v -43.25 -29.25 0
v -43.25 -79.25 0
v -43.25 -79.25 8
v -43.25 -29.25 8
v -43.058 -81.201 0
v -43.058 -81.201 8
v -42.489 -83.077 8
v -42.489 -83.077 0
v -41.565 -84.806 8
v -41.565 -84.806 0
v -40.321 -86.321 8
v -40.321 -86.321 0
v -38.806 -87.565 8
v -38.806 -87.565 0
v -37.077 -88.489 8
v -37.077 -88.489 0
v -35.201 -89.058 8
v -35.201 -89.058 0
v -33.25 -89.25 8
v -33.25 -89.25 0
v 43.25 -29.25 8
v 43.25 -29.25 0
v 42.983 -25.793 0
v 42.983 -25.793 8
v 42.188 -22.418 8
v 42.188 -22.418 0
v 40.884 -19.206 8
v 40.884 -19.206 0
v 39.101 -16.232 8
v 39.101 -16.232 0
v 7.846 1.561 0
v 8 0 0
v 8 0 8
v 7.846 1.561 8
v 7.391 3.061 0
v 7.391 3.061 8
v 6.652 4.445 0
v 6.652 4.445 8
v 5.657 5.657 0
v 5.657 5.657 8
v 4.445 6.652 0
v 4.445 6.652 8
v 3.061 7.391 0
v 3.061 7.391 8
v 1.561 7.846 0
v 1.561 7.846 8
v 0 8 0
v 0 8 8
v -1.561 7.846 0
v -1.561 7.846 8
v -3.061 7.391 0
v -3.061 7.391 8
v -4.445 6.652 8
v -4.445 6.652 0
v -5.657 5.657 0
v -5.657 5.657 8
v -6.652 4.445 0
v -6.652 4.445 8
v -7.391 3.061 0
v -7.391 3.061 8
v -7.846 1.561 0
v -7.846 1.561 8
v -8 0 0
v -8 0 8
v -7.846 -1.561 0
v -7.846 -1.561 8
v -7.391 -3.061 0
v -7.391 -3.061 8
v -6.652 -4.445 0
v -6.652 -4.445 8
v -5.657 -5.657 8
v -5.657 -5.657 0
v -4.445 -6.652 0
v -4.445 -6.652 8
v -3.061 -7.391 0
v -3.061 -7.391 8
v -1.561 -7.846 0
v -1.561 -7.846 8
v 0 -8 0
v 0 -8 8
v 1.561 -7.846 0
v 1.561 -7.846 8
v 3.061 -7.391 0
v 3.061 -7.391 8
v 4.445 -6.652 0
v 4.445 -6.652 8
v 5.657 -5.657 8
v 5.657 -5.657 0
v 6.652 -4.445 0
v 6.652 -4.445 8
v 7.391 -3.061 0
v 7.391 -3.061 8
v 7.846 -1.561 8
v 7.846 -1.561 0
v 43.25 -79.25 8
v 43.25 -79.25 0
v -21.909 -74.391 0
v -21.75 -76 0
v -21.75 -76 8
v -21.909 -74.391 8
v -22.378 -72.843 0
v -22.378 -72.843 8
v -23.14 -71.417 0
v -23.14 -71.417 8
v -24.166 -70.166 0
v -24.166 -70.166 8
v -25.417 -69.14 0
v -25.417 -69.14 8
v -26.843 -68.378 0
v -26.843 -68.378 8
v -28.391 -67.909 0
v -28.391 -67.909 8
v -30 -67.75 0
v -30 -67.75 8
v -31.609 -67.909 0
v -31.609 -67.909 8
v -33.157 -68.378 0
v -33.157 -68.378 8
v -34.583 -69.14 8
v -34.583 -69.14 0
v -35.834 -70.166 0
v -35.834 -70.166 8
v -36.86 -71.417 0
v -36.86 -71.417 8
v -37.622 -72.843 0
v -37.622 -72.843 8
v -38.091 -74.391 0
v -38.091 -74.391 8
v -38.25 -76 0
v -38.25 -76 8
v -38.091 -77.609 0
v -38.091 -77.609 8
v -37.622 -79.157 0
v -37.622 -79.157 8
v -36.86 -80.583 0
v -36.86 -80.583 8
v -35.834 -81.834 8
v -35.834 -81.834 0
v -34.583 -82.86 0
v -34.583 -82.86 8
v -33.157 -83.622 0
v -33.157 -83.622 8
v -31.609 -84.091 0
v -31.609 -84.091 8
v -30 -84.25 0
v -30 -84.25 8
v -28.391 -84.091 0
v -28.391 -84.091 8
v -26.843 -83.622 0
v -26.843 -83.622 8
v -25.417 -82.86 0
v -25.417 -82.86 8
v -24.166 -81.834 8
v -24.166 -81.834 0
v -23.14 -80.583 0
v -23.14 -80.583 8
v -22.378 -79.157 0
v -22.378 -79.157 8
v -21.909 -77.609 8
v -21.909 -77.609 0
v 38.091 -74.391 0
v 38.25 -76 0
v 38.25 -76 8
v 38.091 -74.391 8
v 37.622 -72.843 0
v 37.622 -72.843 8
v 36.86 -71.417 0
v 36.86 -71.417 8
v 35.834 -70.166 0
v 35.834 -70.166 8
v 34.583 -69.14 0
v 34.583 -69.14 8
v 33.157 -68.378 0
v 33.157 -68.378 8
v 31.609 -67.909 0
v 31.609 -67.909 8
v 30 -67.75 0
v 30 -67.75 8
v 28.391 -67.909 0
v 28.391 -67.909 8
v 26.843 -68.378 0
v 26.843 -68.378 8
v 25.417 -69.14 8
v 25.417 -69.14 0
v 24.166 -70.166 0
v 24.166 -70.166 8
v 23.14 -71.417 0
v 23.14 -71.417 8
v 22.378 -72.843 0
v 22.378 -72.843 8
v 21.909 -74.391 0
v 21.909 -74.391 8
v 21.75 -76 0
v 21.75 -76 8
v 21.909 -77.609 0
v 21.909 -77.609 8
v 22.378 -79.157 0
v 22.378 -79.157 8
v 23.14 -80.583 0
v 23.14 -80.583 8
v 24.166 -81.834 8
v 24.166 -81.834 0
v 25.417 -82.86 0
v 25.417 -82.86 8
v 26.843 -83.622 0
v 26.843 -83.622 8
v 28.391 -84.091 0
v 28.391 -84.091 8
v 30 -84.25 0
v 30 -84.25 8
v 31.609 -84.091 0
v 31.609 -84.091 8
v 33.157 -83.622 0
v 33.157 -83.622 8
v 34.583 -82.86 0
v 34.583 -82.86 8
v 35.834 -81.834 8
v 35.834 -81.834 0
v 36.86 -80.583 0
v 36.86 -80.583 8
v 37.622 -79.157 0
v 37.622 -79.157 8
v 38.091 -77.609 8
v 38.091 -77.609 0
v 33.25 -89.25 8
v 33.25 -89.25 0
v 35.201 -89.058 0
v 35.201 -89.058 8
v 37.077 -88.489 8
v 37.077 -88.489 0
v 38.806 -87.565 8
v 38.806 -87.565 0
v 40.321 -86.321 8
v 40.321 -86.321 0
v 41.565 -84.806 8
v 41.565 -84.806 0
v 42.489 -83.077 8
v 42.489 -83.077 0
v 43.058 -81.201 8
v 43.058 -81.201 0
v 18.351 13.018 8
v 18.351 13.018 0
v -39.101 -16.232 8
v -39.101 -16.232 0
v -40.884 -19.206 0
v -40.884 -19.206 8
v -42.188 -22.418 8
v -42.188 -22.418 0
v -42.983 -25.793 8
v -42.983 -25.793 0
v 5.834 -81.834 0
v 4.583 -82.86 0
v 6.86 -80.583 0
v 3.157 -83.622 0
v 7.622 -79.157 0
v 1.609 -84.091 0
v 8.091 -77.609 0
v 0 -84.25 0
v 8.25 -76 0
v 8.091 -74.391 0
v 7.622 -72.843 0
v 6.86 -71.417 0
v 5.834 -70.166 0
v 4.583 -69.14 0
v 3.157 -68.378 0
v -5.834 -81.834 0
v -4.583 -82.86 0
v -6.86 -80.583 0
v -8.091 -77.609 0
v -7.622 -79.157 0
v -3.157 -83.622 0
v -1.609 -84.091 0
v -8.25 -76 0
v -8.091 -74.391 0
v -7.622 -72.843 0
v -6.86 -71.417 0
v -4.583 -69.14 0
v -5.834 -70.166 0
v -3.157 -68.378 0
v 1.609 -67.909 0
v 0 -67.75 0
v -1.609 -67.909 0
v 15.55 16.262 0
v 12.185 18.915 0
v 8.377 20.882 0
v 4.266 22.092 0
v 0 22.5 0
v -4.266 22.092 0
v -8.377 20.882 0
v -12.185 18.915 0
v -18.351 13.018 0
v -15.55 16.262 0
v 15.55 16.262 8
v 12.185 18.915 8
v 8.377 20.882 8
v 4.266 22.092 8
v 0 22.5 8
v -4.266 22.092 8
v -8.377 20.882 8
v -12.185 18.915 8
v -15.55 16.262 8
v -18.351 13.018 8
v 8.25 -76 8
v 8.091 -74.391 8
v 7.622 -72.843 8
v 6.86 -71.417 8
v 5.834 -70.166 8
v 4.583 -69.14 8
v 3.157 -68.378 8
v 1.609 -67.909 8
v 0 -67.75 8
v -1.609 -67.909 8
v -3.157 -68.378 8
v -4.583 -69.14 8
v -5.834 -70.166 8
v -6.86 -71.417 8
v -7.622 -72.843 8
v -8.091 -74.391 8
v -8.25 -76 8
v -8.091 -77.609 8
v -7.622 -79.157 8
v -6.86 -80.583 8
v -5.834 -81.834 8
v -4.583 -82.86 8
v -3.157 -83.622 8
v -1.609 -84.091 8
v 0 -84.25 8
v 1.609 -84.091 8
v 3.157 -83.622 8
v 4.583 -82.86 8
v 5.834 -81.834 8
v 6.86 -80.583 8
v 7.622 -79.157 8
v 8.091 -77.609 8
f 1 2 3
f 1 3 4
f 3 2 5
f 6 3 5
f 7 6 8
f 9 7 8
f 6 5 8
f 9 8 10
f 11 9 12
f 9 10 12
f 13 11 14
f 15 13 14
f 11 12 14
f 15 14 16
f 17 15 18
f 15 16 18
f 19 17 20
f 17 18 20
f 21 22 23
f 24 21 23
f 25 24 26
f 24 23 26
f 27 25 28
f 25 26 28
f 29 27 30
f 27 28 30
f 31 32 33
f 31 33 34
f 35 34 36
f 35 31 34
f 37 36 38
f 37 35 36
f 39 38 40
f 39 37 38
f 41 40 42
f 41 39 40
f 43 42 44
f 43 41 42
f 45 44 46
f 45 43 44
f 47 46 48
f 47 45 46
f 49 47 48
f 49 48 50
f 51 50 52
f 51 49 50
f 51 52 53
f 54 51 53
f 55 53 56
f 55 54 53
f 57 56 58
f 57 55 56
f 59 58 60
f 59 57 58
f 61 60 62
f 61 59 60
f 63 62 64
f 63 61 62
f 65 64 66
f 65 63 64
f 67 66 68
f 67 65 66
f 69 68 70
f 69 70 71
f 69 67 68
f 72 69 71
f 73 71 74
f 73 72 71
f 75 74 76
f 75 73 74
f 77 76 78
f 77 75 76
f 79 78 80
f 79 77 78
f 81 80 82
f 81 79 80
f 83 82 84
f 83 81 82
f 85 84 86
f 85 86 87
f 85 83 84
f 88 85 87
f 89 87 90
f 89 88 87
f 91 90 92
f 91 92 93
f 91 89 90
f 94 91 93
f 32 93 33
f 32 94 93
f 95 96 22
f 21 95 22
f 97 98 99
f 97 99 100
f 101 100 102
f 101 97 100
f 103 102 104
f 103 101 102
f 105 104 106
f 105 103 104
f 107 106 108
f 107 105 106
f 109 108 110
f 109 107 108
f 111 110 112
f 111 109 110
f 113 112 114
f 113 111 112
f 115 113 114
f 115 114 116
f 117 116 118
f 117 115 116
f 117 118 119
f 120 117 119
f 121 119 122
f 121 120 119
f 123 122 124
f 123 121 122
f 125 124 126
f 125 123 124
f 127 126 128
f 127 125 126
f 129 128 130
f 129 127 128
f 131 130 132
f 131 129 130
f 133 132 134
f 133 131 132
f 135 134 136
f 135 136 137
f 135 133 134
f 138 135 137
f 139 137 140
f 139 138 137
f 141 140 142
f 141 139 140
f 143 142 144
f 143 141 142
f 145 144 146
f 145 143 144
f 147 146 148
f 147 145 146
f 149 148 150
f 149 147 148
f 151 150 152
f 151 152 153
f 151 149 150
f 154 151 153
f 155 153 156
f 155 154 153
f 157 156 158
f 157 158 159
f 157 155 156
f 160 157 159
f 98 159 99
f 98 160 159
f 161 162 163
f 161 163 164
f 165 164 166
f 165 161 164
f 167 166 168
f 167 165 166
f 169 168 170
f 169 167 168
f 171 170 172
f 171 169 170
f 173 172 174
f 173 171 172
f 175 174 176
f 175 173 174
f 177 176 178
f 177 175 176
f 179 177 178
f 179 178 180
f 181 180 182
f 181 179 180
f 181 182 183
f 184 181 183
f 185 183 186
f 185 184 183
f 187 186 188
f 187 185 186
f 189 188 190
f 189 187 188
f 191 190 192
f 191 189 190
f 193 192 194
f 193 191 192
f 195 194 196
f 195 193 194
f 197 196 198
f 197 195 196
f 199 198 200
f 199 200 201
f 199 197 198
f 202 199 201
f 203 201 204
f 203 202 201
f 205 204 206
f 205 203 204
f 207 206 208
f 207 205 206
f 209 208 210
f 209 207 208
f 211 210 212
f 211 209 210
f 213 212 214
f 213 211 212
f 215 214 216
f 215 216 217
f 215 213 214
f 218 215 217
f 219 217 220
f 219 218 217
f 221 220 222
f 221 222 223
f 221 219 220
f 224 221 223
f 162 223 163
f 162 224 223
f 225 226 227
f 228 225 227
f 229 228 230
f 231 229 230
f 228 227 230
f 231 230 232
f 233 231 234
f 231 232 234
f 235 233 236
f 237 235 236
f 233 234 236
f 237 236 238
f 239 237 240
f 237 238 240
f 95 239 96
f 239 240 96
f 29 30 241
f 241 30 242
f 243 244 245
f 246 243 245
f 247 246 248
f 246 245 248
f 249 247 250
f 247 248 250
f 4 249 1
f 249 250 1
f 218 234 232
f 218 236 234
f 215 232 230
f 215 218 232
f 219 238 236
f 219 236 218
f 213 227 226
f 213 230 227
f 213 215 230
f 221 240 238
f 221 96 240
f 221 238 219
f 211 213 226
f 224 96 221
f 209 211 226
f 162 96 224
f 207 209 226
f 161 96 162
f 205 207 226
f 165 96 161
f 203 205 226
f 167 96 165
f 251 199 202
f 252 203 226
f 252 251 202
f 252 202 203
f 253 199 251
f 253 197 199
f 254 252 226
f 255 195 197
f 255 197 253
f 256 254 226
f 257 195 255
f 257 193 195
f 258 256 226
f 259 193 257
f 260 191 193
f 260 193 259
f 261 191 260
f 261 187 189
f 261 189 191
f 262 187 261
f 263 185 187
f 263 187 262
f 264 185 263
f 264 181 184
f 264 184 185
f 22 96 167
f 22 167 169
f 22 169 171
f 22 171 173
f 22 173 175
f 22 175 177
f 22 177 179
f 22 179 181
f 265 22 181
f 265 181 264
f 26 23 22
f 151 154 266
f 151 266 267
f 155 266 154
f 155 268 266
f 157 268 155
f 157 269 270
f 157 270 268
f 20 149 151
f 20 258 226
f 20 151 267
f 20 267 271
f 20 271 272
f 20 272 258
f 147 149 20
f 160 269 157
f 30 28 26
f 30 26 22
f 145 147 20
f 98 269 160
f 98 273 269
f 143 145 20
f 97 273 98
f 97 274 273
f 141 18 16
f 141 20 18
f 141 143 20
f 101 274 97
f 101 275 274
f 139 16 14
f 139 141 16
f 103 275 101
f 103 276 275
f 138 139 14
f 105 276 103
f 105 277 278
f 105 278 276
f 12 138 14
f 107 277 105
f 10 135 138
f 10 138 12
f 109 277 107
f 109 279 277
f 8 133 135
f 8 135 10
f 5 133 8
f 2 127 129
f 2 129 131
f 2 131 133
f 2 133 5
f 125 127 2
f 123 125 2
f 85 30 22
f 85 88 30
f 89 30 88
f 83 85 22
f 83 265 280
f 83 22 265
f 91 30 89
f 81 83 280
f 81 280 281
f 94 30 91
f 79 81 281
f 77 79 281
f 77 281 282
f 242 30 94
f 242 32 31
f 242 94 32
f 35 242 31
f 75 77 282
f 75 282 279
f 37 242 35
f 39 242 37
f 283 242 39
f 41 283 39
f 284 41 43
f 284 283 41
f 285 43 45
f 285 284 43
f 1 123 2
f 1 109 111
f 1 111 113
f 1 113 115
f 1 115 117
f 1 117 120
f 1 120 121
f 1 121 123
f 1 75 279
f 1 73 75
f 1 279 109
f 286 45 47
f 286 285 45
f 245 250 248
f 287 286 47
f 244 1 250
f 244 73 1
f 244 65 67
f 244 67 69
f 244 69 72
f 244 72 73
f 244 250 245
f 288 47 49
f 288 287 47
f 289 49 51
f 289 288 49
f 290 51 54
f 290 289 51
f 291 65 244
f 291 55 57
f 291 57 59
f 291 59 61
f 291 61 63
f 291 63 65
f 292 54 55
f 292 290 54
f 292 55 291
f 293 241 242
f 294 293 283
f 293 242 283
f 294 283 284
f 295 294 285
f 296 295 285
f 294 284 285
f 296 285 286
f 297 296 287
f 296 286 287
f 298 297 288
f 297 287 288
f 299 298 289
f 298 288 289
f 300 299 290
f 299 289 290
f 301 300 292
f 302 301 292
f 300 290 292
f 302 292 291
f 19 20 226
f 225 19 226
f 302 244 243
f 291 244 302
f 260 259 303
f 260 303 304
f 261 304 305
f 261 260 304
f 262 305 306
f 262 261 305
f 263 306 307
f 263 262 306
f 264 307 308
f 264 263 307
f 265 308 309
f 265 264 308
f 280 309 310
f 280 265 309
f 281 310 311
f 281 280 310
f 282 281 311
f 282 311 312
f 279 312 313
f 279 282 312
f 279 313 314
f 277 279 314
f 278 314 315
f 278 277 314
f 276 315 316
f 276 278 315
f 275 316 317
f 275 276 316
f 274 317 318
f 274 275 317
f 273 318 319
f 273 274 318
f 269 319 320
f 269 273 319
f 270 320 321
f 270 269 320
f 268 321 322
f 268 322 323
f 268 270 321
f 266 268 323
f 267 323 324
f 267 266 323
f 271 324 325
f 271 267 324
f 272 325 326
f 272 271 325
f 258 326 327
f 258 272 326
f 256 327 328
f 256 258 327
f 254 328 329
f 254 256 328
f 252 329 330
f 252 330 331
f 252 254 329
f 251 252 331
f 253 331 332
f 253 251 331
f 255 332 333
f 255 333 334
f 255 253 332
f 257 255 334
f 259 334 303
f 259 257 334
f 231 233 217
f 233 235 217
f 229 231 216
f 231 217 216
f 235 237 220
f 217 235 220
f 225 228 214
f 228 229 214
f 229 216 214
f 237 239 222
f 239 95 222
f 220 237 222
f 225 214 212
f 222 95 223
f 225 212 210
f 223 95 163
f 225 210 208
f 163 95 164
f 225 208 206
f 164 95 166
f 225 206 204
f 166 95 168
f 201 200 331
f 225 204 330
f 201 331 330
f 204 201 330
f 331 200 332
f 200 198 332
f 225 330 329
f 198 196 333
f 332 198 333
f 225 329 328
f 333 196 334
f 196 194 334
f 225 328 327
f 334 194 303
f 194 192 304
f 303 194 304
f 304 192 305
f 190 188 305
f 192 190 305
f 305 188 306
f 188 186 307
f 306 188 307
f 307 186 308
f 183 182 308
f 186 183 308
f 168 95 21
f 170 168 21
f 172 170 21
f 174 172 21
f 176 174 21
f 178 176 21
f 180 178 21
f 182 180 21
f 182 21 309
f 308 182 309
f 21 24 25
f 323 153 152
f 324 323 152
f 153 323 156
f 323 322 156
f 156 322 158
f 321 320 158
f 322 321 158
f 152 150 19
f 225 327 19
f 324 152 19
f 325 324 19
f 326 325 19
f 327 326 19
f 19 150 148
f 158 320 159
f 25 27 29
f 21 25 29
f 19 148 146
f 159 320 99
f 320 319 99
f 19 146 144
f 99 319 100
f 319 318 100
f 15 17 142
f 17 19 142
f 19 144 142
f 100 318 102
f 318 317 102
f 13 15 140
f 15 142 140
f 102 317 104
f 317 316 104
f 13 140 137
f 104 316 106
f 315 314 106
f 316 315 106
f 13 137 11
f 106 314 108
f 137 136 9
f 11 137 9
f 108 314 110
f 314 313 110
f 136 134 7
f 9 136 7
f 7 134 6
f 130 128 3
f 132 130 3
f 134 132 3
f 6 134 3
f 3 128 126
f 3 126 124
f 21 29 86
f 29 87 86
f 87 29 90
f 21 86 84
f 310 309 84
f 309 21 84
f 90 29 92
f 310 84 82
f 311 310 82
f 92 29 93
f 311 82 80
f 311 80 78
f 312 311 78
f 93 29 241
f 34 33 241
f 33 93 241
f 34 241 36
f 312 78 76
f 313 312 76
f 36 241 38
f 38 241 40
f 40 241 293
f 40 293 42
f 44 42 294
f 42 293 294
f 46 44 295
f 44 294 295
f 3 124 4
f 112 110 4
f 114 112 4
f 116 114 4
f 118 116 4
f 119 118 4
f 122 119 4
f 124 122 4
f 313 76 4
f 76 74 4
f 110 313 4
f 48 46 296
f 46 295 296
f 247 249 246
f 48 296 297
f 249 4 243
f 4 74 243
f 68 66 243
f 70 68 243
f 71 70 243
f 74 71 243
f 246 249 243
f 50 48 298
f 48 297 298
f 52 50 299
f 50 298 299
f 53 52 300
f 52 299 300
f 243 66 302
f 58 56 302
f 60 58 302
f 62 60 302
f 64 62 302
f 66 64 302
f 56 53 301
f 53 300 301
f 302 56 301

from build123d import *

# Parameters (mm, degrees)
SKETCH_R   = 8
SKETCH_R_2 = 8.25
PAD_DEPTH  = 8


with BuildPart() as part:
    # Sketch → Pad (new body)
    with BuildSketch(Plane.XY):
        with BuildLine():
            Line((-43.25, -79.25), (-43.25, -29.25))
            ThreePointArc((-39.101298, -16.231558), (-42.18775, -22.418244), (-43.25, -29.25))
            Line((-39.101298, -16.231558), (-18.351298, 13.018442))
            ThreePointArc((18.351298, 13.018442), (0, 22.5), (-18.351298, 13.018442))
            Line((39.101298, -16.231558), (18.351298, 13.018442))
            ThreePointArc((43.25, -29.25), (42.18775, -22.418244), (39.101298, -16.231558))
            Line((43.25, -79.25), (43.25, -29.25))
            ThreePointArc((33.25, -89.25), (40.321068, -86.321068), (43.25, -79.25))
            Line((-33.25, -89.25), (33.25, -89.25))
            ThreePointArc((-43.25, -79.25), (-40.321068, -86.321068), (-33.25, -89.25))
        make_face()
        Circle(SKETCH_R, mode=Mode.SUBTRACT)
        with Locations((0, -76)):
            Circle(SKETCH_R_2, mode=Mode.SUBTRACT)
        with Locations((30, -76)):
            Circle(SKETCH_R_2, mode=Mode.SUBTRACT)
        with Locations((-30, -76)):
            Circle(SKETCH_R_2, mode=Mode.SUBTRACT)
    extrude(amount=PAD_DEPTH)


solid = part.part
